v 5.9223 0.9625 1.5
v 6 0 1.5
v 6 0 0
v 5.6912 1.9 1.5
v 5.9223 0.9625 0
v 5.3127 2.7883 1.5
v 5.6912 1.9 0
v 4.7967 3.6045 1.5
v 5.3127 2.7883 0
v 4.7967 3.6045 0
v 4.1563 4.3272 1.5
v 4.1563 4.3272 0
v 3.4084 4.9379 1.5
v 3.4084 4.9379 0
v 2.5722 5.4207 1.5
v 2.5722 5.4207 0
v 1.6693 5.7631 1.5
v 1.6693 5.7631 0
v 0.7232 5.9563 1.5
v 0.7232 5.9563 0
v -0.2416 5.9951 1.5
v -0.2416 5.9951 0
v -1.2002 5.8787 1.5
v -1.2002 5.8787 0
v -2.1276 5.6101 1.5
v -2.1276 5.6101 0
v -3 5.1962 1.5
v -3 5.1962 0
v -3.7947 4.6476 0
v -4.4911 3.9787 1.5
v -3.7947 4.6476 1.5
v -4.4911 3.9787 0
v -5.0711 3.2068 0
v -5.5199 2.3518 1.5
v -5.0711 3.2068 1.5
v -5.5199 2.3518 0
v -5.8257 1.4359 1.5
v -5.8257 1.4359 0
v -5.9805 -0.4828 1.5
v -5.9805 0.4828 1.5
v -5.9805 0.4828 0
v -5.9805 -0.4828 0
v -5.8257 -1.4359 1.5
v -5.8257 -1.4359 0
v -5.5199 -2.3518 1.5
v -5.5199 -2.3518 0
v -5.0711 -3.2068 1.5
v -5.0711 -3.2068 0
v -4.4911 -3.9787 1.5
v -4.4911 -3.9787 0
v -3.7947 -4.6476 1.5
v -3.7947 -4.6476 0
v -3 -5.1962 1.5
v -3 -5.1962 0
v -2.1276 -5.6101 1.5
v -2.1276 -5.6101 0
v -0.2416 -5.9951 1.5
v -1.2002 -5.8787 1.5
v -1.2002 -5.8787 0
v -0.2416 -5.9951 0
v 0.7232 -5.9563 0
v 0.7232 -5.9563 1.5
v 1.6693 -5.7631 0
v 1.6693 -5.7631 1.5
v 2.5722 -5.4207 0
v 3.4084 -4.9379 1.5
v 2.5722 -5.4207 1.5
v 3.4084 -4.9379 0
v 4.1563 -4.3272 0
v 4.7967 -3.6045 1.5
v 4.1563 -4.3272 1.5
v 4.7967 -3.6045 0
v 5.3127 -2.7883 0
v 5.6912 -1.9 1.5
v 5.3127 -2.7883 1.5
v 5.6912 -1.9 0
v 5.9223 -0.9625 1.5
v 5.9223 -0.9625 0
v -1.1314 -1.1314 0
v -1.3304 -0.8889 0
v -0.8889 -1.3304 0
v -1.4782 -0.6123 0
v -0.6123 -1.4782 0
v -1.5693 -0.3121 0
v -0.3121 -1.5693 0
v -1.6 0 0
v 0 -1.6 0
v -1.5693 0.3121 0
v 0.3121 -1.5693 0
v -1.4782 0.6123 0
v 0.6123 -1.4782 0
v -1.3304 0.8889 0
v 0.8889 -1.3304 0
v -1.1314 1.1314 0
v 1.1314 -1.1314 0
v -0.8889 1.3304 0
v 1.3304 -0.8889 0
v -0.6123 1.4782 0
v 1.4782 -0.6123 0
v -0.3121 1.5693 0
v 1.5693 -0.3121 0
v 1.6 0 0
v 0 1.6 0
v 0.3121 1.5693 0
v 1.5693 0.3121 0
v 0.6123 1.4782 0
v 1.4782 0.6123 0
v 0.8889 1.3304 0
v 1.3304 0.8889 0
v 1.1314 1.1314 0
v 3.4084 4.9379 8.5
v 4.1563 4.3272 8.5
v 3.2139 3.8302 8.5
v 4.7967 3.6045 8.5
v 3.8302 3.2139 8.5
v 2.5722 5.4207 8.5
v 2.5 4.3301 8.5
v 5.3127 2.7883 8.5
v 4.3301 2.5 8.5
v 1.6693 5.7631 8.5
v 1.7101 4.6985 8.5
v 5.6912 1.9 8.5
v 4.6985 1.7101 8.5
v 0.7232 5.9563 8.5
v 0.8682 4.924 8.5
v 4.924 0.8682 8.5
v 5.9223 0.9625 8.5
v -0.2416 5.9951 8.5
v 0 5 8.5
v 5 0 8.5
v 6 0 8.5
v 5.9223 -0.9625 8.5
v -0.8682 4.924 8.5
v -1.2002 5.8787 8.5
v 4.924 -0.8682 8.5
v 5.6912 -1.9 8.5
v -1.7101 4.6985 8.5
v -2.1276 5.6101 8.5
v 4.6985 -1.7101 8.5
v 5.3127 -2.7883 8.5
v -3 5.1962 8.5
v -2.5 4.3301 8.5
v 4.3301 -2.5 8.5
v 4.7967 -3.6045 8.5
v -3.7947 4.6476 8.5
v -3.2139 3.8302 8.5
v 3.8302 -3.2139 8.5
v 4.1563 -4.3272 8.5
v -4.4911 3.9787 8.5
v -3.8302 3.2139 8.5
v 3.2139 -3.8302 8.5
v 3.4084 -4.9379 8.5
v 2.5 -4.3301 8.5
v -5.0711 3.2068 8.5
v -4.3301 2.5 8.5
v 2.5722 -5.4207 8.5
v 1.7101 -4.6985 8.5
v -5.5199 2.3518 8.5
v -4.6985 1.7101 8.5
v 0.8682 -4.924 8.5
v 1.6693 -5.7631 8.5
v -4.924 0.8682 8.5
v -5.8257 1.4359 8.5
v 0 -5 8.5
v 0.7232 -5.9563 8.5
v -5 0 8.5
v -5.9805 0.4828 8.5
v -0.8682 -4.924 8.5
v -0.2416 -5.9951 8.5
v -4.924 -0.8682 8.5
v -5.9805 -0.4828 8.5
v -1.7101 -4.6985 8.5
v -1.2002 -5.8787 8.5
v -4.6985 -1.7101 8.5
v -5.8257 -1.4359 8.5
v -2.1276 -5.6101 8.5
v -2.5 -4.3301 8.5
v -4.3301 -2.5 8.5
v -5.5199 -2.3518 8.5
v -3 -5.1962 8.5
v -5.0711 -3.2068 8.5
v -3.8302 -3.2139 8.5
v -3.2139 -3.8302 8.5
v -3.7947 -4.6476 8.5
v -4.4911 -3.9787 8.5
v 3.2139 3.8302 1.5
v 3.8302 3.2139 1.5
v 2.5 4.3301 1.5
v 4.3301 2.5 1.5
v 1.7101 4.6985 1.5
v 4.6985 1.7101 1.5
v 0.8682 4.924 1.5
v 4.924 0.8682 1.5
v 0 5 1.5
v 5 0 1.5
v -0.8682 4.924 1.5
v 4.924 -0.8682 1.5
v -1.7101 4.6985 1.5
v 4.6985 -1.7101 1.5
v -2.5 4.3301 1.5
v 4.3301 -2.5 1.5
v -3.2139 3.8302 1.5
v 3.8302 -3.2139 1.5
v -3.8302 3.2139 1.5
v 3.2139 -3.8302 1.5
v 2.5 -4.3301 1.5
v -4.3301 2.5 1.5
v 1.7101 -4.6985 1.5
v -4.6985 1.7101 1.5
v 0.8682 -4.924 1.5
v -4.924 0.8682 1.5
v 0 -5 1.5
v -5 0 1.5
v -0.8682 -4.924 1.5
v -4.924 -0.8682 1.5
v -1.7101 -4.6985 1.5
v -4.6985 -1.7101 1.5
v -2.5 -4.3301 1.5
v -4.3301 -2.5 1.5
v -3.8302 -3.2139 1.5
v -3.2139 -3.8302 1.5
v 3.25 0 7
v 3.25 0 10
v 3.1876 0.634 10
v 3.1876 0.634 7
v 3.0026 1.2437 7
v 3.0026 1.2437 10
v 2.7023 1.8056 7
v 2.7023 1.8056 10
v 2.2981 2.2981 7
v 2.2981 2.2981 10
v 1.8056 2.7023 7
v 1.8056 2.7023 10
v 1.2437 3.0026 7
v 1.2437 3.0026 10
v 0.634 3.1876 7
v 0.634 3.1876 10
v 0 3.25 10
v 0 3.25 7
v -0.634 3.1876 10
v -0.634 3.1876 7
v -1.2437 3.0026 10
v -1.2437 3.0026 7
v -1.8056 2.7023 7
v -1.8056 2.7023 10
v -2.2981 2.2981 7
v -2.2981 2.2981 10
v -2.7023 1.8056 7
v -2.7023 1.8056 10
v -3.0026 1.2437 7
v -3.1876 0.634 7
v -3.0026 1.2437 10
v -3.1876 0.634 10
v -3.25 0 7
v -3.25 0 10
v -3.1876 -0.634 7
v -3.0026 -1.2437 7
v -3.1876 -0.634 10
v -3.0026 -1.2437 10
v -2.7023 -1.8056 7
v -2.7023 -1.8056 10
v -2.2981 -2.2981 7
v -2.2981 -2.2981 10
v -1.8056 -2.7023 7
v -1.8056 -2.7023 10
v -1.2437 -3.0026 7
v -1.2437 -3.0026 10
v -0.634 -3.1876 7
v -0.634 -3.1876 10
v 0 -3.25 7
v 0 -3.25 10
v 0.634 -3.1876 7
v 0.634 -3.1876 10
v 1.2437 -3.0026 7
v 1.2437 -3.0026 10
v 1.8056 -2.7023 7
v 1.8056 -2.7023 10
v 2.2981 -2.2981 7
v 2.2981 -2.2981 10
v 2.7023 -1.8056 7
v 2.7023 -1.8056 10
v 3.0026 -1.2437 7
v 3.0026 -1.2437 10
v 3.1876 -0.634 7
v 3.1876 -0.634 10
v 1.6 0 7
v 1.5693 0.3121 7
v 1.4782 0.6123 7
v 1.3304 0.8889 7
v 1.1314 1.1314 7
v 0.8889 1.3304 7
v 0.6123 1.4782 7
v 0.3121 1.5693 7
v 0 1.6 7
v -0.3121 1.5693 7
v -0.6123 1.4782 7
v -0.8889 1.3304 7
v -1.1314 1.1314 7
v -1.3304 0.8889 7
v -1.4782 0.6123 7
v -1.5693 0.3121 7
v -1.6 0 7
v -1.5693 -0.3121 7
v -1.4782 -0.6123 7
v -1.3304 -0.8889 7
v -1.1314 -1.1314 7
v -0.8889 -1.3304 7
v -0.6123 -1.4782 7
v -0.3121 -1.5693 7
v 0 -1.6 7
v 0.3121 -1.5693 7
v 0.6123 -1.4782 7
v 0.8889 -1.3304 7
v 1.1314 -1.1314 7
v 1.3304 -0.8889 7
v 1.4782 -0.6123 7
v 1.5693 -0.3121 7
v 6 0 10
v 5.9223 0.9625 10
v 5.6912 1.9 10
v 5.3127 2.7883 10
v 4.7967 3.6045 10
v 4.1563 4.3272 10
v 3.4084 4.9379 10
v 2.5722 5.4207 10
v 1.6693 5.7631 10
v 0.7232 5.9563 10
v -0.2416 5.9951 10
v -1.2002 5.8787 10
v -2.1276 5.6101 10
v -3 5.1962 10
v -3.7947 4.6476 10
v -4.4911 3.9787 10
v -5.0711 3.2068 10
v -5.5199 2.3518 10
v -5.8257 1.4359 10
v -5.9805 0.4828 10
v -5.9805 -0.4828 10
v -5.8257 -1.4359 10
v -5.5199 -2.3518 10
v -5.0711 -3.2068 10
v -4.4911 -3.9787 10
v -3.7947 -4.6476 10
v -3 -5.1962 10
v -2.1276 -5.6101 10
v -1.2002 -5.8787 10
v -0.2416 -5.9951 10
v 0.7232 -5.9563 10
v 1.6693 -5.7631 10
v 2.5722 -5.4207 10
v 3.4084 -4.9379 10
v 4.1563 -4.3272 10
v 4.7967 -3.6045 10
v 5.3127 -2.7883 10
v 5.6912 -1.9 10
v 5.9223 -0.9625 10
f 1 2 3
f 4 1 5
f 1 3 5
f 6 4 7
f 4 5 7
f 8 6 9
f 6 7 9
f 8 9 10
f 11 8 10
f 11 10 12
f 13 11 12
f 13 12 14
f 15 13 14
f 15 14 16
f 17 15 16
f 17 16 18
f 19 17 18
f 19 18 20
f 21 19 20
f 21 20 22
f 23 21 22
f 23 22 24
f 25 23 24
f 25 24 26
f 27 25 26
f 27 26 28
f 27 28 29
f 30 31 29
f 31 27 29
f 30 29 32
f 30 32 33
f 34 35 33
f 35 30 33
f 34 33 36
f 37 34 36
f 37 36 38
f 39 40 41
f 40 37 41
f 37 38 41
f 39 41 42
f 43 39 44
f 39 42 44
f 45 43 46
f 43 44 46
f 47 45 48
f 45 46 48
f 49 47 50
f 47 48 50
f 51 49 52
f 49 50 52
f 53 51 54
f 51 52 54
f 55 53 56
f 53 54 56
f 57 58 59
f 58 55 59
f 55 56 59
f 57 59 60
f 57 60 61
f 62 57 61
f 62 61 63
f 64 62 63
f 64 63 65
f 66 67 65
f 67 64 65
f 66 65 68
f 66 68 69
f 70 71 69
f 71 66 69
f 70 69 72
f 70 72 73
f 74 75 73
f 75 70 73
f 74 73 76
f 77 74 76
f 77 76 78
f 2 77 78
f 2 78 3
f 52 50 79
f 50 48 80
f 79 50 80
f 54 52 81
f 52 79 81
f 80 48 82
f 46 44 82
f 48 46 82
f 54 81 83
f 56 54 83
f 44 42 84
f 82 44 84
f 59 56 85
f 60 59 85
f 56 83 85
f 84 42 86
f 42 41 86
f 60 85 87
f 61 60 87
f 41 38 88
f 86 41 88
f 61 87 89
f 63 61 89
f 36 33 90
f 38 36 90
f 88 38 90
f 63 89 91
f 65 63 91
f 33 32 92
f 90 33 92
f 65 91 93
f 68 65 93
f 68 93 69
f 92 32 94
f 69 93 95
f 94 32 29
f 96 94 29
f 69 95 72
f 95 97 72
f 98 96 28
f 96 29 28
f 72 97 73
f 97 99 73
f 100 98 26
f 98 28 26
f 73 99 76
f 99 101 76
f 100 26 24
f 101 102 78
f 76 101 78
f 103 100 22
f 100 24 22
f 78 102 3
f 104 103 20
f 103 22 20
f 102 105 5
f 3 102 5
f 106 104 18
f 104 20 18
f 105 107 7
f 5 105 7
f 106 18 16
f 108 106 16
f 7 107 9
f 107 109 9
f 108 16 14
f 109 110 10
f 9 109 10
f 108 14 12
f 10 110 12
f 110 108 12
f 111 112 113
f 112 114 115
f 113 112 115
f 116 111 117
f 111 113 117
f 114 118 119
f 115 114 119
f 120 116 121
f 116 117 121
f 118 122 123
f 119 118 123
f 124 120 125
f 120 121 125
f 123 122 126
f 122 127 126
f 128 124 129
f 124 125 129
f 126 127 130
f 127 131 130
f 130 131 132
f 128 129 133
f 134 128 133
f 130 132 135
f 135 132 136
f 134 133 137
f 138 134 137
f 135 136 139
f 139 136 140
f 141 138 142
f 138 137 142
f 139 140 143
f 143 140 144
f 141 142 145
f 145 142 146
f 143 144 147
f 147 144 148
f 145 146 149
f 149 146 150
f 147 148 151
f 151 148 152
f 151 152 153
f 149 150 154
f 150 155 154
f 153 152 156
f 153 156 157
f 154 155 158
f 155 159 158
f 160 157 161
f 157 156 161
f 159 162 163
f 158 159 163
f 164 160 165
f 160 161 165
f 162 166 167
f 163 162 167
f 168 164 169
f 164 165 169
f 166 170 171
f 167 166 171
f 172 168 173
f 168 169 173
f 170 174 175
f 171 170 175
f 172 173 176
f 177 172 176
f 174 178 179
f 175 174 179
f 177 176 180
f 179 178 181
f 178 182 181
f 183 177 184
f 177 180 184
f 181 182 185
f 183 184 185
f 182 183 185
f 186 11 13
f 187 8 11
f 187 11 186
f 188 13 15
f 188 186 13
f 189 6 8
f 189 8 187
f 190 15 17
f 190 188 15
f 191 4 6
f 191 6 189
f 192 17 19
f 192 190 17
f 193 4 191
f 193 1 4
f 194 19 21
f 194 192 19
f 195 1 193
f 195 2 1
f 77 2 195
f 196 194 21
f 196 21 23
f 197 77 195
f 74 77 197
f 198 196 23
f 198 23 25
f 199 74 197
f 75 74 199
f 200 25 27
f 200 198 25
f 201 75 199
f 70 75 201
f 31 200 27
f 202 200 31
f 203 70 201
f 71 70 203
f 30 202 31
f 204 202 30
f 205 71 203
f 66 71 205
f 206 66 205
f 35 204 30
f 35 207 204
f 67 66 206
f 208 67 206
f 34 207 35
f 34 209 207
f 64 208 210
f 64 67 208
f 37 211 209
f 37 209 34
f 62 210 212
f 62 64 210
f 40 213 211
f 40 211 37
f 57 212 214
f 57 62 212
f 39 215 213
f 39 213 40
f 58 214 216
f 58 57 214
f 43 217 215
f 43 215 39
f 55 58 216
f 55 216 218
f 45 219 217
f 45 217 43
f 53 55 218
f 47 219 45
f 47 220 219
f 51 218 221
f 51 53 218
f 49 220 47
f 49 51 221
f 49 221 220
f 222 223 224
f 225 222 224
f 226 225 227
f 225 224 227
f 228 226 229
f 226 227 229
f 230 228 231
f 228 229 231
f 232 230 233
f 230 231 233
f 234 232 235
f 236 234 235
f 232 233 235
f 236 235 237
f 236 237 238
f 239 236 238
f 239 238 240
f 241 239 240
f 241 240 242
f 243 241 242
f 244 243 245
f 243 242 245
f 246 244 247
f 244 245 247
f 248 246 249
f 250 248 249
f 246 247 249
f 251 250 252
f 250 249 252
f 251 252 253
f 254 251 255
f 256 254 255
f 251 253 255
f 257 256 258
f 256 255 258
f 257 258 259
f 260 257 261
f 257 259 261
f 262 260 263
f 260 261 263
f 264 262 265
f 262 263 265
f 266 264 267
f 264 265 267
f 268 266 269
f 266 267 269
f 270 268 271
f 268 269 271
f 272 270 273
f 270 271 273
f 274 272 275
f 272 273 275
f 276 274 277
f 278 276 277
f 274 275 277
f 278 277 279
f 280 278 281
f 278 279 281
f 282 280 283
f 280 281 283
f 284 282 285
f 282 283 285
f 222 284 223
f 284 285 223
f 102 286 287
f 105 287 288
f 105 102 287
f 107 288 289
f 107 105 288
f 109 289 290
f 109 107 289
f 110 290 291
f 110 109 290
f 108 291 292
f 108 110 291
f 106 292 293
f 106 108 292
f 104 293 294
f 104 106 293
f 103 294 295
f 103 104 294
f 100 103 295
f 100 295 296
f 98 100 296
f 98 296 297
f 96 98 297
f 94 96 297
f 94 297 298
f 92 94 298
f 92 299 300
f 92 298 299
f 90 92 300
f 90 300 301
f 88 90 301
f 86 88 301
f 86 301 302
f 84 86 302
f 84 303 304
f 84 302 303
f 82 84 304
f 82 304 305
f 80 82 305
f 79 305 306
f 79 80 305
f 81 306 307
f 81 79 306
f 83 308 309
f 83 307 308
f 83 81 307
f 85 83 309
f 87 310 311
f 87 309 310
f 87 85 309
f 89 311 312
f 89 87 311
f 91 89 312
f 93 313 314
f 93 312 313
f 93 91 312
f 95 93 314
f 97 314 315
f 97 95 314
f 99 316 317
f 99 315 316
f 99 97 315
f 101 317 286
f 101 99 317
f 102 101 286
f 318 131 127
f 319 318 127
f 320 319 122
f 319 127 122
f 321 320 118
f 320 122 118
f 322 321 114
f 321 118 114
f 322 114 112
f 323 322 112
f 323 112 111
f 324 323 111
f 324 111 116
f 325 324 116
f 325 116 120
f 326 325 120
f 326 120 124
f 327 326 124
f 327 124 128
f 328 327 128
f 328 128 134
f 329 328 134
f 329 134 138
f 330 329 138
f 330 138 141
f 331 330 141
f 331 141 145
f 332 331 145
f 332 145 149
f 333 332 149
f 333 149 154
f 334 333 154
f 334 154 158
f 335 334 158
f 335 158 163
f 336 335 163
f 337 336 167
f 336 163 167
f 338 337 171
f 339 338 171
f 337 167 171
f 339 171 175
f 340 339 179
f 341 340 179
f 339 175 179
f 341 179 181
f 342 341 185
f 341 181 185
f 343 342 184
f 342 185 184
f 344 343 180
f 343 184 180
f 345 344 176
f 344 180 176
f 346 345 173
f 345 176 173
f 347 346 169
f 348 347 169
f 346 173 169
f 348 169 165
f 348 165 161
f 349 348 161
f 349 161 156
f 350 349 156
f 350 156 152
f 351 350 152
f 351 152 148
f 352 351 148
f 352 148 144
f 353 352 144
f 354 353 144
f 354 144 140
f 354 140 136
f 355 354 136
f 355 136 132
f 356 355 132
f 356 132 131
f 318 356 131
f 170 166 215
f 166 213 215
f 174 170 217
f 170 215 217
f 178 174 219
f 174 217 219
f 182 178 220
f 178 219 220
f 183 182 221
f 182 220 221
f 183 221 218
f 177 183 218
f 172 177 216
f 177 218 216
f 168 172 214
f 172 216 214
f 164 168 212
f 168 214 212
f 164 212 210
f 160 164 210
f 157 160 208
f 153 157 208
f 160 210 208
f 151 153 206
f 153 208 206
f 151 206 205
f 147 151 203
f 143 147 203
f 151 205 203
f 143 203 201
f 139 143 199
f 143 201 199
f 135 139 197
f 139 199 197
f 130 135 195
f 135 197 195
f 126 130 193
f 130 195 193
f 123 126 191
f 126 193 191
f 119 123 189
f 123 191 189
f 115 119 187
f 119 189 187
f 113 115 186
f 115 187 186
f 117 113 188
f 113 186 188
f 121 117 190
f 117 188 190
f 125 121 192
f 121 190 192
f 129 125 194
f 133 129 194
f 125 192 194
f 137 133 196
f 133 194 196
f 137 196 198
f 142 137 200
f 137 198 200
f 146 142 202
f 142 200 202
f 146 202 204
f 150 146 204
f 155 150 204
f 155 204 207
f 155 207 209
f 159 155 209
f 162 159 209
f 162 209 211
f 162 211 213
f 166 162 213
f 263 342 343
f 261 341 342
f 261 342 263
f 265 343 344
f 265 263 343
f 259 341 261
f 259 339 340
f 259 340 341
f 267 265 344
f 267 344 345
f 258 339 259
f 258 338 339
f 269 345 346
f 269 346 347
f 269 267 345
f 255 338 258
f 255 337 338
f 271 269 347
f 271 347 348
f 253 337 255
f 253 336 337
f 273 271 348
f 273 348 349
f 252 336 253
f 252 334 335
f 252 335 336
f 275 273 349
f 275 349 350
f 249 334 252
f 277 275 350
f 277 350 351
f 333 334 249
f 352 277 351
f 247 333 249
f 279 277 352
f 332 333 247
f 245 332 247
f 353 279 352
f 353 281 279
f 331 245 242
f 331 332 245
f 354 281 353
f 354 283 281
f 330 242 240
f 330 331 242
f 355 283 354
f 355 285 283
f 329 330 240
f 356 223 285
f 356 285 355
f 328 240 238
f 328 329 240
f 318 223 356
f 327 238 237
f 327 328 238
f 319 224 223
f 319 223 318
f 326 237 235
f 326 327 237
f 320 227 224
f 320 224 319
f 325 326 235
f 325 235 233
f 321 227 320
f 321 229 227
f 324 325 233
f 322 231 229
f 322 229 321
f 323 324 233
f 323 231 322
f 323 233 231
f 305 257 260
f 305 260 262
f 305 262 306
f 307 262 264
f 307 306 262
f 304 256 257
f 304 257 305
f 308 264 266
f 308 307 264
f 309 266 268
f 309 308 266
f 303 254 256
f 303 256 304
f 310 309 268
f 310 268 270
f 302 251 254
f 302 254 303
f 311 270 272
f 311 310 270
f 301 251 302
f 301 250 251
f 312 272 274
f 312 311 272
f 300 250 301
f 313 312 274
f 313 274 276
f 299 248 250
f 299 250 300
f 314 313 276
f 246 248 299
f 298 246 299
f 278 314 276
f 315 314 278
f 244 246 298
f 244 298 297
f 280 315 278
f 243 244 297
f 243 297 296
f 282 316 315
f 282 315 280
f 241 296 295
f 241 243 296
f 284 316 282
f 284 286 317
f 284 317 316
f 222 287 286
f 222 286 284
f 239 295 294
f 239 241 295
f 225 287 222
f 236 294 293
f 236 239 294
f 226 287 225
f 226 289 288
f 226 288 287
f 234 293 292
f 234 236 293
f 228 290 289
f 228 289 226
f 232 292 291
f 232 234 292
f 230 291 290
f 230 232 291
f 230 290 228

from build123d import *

# Parameters (mm, degrees)
SKETCH1_R           = 6
SKETCH1_R_2         = 1.6
BOSS_EXTRUDE1_DEPTH = 10
SKETCH2_W           = 1.332407761
SKETCH2_H           = 7
SKETCH4_R           = 3.25
CUT_EXTRUDE1_DEPTH  = 3


with BuildPart() as part:
    # Sketch1 → Boss-Extrude1 (new body)
    with BuildSketch(Plane.XY):
        Circle(SKETCH1_R)
        Circle(SKETCH1_R_2, mode=Mode.SUBTRACT)
    extrude(amount=BOSS_EXTRUDE1_DEPTH)

    # Sketch2 → Cut-Revolve1 (revolve, cut)
    with BuildSketch(Plane(origin=(0, 0, 0), x_dir=(1, 0, 0), z_dir=(0, 1, 0))):
        with Locations((-5.666203881, -5)):
            Rectangle(SKETCH2_W, SKETCH2_H)
    revolve(axis=Axis((0, 0, 0), (0, 0, 1)), mode=Mode.SUBTRACT)

    # Sketch4 → Cut-Extrude1 (cut)
    with BuildSketch(Plane.XY.offset(10)):
        Circle(SKETCH4_R)
    extrude(amount=-CUT_EXTRUDE1_DEPTH, mode=Mode.SUBTRACT)


solid = part.part
